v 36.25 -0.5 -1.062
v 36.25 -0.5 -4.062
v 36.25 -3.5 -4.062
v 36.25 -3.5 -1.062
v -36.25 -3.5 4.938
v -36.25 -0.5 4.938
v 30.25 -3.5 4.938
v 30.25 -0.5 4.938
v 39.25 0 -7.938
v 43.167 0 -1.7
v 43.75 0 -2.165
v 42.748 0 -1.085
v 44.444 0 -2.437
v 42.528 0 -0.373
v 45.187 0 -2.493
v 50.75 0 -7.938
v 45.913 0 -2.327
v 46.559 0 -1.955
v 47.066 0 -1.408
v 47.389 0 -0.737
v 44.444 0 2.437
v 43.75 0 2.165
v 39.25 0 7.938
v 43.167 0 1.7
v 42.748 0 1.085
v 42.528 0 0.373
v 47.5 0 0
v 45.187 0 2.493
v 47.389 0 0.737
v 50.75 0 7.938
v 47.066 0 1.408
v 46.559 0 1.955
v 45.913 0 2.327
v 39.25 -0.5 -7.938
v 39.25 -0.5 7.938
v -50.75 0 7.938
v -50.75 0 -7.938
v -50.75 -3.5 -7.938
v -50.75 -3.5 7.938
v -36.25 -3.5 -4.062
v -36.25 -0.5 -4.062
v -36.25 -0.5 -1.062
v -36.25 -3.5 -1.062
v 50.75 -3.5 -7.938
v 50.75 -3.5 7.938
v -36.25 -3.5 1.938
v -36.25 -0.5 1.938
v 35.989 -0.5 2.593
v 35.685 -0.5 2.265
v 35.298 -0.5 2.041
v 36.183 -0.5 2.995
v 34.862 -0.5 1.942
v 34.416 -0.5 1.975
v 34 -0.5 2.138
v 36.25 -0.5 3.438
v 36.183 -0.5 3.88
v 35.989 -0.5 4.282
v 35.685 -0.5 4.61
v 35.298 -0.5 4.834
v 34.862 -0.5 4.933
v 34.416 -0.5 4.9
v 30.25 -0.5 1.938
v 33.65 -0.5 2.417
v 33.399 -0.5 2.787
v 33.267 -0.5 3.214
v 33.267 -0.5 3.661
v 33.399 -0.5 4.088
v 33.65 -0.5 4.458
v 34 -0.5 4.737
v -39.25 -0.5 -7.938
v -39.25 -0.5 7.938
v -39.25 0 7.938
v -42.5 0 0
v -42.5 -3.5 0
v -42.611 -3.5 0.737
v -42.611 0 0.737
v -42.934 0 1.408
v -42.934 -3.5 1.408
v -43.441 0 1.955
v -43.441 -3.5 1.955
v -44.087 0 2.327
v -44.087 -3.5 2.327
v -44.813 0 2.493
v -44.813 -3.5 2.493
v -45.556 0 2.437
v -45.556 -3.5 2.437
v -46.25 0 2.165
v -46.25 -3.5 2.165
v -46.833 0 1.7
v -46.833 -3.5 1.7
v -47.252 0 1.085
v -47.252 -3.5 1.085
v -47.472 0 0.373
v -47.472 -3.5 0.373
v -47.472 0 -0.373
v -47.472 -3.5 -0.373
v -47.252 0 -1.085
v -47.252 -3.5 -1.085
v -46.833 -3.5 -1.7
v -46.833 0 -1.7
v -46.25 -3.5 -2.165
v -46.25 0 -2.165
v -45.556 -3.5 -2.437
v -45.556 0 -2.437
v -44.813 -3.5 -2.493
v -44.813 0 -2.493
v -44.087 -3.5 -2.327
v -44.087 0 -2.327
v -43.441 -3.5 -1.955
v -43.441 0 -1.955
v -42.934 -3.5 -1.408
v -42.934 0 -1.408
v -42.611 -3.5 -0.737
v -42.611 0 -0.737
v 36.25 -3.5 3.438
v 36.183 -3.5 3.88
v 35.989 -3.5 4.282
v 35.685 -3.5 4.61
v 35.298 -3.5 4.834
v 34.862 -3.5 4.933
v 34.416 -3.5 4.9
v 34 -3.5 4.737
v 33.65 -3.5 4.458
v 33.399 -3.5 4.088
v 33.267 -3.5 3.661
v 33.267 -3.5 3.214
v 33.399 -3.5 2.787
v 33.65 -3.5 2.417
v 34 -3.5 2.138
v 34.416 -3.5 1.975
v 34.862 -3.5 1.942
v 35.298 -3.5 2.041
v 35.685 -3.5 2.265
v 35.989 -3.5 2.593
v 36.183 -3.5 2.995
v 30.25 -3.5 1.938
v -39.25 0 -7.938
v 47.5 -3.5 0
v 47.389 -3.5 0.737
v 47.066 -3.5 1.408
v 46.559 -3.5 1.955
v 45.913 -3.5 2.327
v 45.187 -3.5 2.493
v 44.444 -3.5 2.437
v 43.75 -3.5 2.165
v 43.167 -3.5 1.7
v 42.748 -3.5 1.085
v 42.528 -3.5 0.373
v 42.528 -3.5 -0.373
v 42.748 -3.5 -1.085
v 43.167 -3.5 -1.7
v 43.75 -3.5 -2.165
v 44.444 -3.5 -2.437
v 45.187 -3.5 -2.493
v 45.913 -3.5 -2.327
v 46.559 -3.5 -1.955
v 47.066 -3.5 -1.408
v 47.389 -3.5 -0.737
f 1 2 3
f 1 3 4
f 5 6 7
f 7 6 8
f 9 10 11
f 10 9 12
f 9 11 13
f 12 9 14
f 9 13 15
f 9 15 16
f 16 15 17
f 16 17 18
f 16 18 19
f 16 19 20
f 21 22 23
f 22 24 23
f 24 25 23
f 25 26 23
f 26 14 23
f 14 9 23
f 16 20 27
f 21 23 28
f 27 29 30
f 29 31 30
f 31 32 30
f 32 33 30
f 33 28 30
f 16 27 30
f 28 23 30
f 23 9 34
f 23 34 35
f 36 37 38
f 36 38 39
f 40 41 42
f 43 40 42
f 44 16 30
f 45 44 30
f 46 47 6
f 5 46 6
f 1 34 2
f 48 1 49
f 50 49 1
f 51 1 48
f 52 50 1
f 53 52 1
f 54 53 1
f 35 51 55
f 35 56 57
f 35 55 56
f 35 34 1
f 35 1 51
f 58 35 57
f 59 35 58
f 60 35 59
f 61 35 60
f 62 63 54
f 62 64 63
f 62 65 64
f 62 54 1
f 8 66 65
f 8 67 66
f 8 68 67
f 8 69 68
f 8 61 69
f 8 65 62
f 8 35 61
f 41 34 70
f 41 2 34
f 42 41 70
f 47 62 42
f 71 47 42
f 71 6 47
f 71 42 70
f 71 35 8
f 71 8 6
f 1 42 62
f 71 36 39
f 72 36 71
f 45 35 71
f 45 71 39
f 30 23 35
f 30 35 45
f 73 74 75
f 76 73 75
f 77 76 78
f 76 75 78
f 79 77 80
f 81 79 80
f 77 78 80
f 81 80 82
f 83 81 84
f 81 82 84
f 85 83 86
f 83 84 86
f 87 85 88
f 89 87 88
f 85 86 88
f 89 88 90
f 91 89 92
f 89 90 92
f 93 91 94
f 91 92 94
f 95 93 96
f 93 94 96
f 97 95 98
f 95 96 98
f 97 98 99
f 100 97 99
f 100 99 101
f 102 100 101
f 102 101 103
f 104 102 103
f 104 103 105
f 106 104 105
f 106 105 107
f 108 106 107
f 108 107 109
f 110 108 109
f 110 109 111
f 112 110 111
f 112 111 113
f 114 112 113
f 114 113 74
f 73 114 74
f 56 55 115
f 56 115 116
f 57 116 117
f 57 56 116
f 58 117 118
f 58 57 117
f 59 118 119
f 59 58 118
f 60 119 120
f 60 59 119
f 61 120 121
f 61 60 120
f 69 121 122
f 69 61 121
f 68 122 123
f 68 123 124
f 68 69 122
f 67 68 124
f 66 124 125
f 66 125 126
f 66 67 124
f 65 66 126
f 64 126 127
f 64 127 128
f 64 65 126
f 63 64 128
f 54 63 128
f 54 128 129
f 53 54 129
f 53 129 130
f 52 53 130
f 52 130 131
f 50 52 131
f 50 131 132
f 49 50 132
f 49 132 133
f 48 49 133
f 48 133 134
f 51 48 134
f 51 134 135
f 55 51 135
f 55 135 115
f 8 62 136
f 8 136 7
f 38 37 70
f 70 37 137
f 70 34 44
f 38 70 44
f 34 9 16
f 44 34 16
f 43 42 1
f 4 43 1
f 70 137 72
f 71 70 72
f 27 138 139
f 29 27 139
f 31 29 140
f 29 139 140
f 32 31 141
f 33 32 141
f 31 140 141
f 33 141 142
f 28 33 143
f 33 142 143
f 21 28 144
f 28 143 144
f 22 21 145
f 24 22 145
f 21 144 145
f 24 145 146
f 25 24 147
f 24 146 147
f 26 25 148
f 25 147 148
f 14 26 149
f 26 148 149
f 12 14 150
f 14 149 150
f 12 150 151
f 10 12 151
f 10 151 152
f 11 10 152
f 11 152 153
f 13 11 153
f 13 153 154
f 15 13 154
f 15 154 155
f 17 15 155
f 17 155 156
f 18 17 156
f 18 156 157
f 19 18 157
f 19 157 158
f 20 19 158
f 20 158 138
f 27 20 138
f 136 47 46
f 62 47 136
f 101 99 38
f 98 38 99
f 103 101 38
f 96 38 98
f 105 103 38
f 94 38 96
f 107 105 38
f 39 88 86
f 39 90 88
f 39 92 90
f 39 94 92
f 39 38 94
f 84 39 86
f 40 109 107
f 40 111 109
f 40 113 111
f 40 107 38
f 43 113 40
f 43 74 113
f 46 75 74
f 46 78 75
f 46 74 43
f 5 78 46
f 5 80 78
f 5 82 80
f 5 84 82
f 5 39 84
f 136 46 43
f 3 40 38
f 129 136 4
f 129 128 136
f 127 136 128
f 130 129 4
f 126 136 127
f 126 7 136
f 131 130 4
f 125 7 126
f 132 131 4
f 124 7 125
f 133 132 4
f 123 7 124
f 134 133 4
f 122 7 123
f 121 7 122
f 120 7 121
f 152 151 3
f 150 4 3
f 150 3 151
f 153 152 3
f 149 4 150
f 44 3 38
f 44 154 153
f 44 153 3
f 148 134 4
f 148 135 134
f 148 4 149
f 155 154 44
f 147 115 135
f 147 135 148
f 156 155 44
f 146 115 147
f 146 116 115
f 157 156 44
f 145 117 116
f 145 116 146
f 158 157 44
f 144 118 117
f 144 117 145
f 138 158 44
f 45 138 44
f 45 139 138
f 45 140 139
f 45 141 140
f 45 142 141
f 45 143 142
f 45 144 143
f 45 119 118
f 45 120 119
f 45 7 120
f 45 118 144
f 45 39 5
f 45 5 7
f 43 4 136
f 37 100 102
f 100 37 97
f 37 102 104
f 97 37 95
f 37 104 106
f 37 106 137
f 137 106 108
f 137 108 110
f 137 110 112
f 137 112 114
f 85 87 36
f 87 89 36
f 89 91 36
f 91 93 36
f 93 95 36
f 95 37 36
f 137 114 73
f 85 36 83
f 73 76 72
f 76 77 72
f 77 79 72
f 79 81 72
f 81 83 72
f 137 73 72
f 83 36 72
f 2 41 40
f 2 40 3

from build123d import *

# Parameters (mm, degrees)
F0_W     = 101.5
F0_H     = 15.875
F0_W_2   = 72.5
F0_H_2   = 3
F0_W_3   = 66.5
F0_R     = 1.5
F1_DEPTH = 3.5
F2_W     = 78.5
F2_H     = 15.875
F3_DEPTH = 0.5
F4_R     = 2.5
F5_DEPTH = 25


with BuildPart() as f1:
    # F0 (on Front) → F1 (new body)
    with BuildSketch(Plane.XZ):
        Rectangle(F0_W, F0_H)
        with Locations((0, -2.5625)):
            Rectangle(F0_W_2, F0_H_2, mode=Mode.SUBTRACT)
        with Locations((-3, 3.4375)):
            Rectangle(F0_W_3, F0_H_2, mode=Mode.SUBTRACT)
        with Locations((34.75, 3.4375)):
            Circle(F0_R, mode=Mode.SUBTRACT)
    extrude(amount=F1_DEPTH)

    # F2 (on face) → F3 (cut)
    with BuildSketch(Plane(origin=(0, 0, 0), x_dir=(-1, 0, 0), z_dir=(0, 1, 0))):
        Rectangle(F2_W, F2_H)
    extrude(amount=-F3_DEPTH, mode=Mode.SUBTRACT)

    # F4 (on face) → F5 (cut)
    with BuildSketch(Plane.XZ.offset(3.5)):
        with Locations((-45, 0)):
            Circle(F4_R)
        with Locations((45, 0)):
            Circle(F4_R)
    extrude(amount=-F5_DEPTH, mode=Mode.SUBTRACT)


solid = f1.part
